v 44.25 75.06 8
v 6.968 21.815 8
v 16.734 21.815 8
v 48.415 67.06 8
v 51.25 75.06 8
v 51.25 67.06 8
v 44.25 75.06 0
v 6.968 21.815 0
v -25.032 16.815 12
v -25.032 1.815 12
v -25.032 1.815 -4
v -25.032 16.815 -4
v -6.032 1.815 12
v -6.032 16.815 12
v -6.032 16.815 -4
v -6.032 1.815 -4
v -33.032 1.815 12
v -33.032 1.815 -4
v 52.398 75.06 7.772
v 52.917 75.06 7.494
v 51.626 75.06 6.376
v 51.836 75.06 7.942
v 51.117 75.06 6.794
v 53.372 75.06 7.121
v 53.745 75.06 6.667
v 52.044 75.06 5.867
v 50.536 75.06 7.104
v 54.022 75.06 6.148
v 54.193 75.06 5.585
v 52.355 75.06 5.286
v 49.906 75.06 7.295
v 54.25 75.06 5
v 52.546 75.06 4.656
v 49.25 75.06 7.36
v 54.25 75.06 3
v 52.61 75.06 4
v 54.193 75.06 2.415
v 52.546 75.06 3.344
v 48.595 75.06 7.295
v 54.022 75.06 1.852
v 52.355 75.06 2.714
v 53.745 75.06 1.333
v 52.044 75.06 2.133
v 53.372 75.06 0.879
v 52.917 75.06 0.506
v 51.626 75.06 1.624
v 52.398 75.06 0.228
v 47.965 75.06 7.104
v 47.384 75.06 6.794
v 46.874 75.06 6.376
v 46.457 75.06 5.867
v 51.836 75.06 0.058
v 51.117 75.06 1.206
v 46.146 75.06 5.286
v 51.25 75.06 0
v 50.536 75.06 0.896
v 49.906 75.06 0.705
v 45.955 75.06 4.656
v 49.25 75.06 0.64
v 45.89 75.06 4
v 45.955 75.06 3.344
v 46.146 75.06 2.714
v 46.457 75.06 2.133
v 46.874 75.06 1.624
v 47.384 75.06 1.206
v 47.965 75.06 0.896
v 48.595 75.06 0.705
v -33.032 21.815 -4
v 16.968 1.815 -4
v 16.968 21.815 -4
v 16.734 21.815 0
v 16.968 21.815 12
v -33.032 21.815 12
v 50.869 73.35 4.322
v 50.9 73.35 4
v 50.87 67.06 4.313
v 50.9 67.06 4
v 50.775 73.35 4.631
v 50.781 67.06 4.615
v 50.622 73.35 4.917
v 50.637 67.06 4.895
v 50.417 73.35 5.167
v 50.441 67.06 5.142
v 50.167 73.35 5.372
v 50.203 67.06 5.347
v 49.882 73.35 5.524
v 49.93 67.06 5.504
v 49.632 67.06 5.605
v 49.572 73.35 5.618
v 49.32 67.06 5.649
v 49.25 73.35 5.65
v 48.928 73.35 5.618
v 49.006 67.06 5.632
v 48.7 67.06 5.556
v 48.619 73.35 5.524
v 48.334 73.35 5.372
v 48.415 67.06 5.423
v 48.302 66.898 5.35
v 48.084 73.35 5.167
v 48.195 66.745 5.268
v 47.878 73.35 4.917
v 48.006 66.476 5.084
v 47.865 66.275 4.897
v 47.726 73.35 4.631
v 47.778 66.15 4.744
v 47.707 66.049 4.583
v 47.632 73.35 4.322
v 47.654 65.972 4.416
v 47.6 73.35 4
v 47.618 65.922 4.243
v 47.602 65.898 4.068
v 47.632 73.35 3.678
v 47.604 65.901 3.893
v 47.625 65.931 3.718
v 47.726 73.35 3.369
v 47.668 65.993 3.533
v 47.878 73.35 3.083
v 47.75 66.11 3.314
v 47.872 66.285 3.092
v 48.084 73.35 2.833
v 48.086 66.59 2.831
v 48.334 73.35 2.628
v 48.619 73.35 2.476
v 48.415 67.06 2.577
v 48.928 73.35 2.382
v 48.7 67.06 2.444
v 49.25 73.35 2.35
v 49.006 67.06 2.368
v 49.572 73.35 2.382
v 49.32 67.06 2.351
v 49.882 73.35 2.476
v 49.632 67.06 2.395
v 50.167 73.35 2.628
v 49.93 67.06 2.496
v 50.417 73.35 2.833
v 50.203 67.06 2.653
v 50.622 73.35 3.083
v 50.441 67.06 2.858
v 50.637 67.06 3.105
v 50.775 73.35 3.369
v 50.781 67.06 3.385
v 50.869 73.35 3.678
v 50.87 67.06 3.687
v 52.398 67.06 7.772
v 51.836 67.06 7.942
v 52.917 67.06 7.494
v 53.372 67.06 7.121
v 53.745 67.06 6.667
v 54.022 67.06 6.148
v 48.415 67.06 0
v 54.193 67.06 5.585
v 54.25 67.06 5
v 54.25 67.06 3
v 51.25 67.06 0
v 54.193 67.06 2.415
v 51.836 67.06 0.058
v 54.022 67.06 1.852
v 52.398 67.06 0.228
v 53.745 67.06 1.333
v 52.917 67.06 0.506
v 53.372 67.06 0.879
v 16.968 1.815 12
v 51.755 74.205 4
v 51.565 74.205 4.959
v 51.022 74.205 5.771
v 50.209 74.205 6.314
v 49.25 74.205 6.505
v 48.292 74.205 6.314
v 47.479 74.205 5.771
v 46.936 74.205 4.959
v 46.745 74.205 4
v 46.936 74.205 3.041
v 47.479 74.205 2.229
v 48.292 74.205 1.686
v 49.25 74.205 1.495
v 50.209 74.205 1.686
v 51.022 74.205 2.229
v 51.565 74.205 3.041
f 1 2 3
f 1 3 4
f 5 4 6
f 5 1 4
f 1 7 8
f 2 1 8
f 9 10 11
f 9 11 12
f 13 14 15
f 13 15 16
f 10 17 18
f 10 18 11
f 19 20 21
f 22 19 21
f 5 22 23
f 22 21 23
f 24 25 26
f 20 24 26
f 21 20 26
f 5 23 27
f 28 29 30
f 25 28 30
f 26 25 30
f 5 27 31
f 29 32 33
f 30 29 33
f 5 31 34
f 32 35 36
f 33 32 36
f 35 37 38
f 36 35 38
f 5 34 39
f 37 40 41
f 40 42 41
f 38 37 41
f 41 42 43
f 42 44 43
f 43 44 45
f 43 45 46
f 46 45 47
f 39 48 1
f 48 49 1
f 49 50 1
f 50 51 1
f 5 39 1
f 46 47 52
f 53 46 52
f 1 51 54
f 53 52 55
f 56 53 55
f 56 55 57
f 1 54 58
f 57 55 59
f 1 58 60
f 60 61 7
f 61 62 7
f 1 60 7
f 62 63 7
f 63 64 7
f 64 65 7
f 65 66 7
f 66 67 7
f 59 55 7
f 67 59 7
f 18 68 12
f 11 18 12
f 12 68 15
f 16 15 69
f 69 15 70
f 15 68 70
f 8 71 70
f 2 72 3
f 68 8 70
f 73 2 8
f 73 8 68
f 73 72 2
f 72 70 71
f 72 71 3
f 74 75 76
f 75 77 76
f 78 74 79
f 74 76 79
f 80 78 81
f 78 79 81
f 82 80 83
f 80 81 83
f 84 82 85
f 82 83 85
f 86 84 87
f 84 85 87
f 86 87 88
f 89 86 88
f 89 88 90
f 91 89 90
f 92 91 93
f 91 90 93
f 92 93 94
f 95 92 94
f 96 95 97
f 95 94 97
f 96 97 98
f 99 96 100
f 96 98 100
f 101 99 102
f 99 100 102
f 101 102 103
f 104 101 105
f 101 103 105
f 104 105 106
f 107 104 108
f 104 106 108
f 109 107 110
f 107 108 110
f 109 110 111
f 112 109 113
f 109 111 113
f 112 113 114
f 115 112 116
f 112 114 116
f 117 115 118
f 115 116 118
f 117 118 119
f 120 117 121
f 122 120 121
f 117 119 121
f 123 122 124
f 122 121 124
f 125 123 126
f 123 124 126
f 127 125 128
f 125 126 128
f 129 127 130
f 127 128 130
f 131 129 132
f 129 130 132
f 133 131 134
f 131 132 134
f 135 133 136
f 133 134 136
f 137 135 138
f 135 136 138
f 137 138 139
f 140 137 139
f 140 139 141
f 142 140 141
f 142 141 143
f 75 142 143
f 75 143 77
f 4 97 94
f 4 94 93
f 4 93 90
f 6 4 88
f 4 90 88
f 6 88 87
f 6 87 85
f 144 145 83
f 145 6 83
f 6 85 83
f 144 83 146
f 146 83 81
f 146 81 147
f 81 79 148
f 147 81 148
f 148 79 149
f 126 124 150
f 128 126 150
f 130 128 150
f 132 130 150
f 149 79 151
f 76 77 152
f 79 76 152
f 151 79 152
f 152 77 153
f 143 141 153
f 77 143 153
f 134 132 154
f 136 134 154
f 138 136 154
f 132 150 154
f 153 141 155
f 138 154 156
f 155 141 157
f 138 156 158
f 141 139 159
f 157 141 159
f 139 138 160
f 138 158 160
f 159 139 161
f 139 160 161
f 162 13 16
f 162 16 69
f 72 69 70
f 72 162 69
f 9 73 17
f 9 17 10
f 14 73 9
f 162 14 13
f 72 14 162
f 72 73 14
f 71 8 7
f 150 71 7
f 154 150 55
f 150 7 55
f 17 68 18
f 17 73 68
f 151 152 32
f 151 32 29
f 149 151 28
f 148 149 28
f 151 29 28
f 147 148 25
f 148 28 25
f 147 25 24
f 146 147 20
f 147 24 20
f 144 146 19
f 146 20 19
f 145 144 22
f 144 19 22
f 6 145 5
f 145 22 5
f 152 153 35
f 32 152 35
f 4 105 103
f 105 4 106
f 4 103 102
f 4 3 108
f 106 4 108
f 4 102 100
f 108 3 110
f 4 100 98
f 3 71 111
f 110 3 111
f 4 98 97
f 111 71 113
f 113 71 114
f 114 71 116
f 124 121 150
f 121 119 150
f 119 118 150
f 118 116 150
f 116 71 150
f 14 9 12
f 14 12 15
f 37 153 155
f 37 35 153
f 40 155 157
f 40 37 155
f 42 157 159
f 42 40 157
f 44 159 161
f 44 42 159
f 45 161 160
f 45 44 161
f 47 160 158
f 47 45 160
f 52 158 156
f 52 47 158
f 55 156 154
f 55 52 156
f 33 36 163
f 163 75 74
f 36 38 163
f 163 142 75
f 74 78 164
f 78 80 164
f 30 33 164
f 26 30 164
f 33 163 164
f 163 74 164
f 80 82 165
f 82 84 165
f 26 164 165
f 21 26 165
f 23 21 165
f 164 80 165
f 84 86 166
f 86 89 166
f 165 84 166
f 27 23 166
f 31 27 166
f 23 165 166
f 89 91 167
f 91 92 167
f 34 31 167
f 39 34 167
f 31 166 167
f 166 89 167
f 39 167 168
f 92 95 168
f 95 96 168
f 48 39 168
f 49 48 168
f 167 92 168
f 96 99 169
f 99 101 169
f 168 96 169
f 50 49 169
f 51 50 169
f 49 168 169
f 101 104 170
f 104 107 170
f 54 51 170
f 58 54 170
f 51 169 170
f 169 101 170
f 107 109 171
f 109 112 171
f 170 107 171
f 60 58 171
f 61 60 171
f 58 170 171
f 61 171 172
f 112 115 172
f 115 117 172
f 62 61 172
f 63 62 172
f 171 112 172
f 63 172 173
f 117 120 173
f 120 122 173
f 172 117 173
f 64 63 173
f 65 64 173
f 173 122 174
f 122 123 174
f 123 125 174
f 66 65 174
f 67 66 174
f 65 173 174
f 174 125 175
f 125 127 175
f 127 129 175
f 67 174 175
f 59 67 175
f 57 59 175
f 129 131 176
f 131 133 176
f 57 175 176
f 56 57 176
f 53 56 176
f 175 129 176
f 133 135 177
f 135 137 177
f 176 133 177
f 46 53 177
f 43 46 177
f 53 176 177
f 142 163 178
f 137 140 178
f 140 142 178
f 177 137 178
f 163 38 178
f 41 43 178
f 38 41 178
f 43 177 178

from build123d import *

# Parameters (mm, degrees)
F1_DEPTH       = 8
F3_D           = 3.3
F3_CSINK_D     = 6.72
F3_CSINK_ANGLE = 90
F4_DEPTH       = 12
F5_DEPTH       = 4
F6_R           = 3


with BuildPart() as f1:
    # F0 (on Top) → F1 (new body)
    with BuildSketch(Plane.XY):
        Polygon((44.2503372943, 75.0596572278), (6.9678689315, 21.814774349), (16.7340656416, 21.814774349), (48.4148736987, 67.0596572278), (54.2503372943, 67.0596572278), (54.2503372943, 75.0596572278), align=None)
    extrude(amount=F1_DEPTH)

    # F3 (through all)
    with Locations(Plane(origin=(0, 75.0596572278, 0), x_dir=(-1, 0, 0), z_dir=(0, 1, 0))):
        with Locations((-49.2503372943, 4)):
            CounterSinkHole(F3_D / 2, F3_CSINK_D / 2, counter_sink_angle=F3_CSINK_ANGLE)

    # F0 (on Top) → F4 (join)
    with BuildSketch(Plane.XY):
        Polygon((16.7340656416, 21.814774349), (6.9678689315, 21.814774349), (6.9678689315, 11.814774349), (16.9678689315, 11.814774349), (16.9678689315, 21.814774349), align=None)
        Polygon((6.9678689315, 11.814774349), (6.9678689315, 21.814774349), (-33.0321310685, 21.814774349), (-33.0321310685, 1.814774349), (-25.0321310685, 1.814774349), (-25.0321310685, 16.814774349), (-6.0321310685, 16.814774349), (-6.0321310685, 1.814774349), (16.9678689315, 1.814774349), (16.9678689315, 11.814774349), align=None)
    extrude(amount=F4_DEPTH)

    # F0 (on Top) → F5 (join)
    with BuildSketch(Plane.XY):
        Polygon((6.9678689315, 11.814774349), (6.9678689315, 21.814774349), (-33.0321310685, 21.814774349), (-33.0321310685, 1.814774349), (-25.0321310685, 1.814774349), (-25.0321310685, 16.814774349), (-6.0321310685, 16.814774349), (-6.0321310685, 1.814774349), (16.9678689315, 1.814774349), (16.9678689315, 11.814774349), align=None)
        Polygon((16.7340656416, 21.814774349), (6.9678689315, 21.814774349), (6.9678689315, 11.814774349), (16.9678689315, 11.814774349), (16.9678689315, 21.814774349), align=None)
    extrude(amount=-F5_DEPTH)

    # F6
    f6_edges = [f1.edges().sort_by_distance(p)[0] for p in [
        (54.250337, 71.059657, 0),
        (54.250337, 71.059657, 8),
    ]]
    fillet(f6_edges, radius=F6_R)


solid = f1.part
